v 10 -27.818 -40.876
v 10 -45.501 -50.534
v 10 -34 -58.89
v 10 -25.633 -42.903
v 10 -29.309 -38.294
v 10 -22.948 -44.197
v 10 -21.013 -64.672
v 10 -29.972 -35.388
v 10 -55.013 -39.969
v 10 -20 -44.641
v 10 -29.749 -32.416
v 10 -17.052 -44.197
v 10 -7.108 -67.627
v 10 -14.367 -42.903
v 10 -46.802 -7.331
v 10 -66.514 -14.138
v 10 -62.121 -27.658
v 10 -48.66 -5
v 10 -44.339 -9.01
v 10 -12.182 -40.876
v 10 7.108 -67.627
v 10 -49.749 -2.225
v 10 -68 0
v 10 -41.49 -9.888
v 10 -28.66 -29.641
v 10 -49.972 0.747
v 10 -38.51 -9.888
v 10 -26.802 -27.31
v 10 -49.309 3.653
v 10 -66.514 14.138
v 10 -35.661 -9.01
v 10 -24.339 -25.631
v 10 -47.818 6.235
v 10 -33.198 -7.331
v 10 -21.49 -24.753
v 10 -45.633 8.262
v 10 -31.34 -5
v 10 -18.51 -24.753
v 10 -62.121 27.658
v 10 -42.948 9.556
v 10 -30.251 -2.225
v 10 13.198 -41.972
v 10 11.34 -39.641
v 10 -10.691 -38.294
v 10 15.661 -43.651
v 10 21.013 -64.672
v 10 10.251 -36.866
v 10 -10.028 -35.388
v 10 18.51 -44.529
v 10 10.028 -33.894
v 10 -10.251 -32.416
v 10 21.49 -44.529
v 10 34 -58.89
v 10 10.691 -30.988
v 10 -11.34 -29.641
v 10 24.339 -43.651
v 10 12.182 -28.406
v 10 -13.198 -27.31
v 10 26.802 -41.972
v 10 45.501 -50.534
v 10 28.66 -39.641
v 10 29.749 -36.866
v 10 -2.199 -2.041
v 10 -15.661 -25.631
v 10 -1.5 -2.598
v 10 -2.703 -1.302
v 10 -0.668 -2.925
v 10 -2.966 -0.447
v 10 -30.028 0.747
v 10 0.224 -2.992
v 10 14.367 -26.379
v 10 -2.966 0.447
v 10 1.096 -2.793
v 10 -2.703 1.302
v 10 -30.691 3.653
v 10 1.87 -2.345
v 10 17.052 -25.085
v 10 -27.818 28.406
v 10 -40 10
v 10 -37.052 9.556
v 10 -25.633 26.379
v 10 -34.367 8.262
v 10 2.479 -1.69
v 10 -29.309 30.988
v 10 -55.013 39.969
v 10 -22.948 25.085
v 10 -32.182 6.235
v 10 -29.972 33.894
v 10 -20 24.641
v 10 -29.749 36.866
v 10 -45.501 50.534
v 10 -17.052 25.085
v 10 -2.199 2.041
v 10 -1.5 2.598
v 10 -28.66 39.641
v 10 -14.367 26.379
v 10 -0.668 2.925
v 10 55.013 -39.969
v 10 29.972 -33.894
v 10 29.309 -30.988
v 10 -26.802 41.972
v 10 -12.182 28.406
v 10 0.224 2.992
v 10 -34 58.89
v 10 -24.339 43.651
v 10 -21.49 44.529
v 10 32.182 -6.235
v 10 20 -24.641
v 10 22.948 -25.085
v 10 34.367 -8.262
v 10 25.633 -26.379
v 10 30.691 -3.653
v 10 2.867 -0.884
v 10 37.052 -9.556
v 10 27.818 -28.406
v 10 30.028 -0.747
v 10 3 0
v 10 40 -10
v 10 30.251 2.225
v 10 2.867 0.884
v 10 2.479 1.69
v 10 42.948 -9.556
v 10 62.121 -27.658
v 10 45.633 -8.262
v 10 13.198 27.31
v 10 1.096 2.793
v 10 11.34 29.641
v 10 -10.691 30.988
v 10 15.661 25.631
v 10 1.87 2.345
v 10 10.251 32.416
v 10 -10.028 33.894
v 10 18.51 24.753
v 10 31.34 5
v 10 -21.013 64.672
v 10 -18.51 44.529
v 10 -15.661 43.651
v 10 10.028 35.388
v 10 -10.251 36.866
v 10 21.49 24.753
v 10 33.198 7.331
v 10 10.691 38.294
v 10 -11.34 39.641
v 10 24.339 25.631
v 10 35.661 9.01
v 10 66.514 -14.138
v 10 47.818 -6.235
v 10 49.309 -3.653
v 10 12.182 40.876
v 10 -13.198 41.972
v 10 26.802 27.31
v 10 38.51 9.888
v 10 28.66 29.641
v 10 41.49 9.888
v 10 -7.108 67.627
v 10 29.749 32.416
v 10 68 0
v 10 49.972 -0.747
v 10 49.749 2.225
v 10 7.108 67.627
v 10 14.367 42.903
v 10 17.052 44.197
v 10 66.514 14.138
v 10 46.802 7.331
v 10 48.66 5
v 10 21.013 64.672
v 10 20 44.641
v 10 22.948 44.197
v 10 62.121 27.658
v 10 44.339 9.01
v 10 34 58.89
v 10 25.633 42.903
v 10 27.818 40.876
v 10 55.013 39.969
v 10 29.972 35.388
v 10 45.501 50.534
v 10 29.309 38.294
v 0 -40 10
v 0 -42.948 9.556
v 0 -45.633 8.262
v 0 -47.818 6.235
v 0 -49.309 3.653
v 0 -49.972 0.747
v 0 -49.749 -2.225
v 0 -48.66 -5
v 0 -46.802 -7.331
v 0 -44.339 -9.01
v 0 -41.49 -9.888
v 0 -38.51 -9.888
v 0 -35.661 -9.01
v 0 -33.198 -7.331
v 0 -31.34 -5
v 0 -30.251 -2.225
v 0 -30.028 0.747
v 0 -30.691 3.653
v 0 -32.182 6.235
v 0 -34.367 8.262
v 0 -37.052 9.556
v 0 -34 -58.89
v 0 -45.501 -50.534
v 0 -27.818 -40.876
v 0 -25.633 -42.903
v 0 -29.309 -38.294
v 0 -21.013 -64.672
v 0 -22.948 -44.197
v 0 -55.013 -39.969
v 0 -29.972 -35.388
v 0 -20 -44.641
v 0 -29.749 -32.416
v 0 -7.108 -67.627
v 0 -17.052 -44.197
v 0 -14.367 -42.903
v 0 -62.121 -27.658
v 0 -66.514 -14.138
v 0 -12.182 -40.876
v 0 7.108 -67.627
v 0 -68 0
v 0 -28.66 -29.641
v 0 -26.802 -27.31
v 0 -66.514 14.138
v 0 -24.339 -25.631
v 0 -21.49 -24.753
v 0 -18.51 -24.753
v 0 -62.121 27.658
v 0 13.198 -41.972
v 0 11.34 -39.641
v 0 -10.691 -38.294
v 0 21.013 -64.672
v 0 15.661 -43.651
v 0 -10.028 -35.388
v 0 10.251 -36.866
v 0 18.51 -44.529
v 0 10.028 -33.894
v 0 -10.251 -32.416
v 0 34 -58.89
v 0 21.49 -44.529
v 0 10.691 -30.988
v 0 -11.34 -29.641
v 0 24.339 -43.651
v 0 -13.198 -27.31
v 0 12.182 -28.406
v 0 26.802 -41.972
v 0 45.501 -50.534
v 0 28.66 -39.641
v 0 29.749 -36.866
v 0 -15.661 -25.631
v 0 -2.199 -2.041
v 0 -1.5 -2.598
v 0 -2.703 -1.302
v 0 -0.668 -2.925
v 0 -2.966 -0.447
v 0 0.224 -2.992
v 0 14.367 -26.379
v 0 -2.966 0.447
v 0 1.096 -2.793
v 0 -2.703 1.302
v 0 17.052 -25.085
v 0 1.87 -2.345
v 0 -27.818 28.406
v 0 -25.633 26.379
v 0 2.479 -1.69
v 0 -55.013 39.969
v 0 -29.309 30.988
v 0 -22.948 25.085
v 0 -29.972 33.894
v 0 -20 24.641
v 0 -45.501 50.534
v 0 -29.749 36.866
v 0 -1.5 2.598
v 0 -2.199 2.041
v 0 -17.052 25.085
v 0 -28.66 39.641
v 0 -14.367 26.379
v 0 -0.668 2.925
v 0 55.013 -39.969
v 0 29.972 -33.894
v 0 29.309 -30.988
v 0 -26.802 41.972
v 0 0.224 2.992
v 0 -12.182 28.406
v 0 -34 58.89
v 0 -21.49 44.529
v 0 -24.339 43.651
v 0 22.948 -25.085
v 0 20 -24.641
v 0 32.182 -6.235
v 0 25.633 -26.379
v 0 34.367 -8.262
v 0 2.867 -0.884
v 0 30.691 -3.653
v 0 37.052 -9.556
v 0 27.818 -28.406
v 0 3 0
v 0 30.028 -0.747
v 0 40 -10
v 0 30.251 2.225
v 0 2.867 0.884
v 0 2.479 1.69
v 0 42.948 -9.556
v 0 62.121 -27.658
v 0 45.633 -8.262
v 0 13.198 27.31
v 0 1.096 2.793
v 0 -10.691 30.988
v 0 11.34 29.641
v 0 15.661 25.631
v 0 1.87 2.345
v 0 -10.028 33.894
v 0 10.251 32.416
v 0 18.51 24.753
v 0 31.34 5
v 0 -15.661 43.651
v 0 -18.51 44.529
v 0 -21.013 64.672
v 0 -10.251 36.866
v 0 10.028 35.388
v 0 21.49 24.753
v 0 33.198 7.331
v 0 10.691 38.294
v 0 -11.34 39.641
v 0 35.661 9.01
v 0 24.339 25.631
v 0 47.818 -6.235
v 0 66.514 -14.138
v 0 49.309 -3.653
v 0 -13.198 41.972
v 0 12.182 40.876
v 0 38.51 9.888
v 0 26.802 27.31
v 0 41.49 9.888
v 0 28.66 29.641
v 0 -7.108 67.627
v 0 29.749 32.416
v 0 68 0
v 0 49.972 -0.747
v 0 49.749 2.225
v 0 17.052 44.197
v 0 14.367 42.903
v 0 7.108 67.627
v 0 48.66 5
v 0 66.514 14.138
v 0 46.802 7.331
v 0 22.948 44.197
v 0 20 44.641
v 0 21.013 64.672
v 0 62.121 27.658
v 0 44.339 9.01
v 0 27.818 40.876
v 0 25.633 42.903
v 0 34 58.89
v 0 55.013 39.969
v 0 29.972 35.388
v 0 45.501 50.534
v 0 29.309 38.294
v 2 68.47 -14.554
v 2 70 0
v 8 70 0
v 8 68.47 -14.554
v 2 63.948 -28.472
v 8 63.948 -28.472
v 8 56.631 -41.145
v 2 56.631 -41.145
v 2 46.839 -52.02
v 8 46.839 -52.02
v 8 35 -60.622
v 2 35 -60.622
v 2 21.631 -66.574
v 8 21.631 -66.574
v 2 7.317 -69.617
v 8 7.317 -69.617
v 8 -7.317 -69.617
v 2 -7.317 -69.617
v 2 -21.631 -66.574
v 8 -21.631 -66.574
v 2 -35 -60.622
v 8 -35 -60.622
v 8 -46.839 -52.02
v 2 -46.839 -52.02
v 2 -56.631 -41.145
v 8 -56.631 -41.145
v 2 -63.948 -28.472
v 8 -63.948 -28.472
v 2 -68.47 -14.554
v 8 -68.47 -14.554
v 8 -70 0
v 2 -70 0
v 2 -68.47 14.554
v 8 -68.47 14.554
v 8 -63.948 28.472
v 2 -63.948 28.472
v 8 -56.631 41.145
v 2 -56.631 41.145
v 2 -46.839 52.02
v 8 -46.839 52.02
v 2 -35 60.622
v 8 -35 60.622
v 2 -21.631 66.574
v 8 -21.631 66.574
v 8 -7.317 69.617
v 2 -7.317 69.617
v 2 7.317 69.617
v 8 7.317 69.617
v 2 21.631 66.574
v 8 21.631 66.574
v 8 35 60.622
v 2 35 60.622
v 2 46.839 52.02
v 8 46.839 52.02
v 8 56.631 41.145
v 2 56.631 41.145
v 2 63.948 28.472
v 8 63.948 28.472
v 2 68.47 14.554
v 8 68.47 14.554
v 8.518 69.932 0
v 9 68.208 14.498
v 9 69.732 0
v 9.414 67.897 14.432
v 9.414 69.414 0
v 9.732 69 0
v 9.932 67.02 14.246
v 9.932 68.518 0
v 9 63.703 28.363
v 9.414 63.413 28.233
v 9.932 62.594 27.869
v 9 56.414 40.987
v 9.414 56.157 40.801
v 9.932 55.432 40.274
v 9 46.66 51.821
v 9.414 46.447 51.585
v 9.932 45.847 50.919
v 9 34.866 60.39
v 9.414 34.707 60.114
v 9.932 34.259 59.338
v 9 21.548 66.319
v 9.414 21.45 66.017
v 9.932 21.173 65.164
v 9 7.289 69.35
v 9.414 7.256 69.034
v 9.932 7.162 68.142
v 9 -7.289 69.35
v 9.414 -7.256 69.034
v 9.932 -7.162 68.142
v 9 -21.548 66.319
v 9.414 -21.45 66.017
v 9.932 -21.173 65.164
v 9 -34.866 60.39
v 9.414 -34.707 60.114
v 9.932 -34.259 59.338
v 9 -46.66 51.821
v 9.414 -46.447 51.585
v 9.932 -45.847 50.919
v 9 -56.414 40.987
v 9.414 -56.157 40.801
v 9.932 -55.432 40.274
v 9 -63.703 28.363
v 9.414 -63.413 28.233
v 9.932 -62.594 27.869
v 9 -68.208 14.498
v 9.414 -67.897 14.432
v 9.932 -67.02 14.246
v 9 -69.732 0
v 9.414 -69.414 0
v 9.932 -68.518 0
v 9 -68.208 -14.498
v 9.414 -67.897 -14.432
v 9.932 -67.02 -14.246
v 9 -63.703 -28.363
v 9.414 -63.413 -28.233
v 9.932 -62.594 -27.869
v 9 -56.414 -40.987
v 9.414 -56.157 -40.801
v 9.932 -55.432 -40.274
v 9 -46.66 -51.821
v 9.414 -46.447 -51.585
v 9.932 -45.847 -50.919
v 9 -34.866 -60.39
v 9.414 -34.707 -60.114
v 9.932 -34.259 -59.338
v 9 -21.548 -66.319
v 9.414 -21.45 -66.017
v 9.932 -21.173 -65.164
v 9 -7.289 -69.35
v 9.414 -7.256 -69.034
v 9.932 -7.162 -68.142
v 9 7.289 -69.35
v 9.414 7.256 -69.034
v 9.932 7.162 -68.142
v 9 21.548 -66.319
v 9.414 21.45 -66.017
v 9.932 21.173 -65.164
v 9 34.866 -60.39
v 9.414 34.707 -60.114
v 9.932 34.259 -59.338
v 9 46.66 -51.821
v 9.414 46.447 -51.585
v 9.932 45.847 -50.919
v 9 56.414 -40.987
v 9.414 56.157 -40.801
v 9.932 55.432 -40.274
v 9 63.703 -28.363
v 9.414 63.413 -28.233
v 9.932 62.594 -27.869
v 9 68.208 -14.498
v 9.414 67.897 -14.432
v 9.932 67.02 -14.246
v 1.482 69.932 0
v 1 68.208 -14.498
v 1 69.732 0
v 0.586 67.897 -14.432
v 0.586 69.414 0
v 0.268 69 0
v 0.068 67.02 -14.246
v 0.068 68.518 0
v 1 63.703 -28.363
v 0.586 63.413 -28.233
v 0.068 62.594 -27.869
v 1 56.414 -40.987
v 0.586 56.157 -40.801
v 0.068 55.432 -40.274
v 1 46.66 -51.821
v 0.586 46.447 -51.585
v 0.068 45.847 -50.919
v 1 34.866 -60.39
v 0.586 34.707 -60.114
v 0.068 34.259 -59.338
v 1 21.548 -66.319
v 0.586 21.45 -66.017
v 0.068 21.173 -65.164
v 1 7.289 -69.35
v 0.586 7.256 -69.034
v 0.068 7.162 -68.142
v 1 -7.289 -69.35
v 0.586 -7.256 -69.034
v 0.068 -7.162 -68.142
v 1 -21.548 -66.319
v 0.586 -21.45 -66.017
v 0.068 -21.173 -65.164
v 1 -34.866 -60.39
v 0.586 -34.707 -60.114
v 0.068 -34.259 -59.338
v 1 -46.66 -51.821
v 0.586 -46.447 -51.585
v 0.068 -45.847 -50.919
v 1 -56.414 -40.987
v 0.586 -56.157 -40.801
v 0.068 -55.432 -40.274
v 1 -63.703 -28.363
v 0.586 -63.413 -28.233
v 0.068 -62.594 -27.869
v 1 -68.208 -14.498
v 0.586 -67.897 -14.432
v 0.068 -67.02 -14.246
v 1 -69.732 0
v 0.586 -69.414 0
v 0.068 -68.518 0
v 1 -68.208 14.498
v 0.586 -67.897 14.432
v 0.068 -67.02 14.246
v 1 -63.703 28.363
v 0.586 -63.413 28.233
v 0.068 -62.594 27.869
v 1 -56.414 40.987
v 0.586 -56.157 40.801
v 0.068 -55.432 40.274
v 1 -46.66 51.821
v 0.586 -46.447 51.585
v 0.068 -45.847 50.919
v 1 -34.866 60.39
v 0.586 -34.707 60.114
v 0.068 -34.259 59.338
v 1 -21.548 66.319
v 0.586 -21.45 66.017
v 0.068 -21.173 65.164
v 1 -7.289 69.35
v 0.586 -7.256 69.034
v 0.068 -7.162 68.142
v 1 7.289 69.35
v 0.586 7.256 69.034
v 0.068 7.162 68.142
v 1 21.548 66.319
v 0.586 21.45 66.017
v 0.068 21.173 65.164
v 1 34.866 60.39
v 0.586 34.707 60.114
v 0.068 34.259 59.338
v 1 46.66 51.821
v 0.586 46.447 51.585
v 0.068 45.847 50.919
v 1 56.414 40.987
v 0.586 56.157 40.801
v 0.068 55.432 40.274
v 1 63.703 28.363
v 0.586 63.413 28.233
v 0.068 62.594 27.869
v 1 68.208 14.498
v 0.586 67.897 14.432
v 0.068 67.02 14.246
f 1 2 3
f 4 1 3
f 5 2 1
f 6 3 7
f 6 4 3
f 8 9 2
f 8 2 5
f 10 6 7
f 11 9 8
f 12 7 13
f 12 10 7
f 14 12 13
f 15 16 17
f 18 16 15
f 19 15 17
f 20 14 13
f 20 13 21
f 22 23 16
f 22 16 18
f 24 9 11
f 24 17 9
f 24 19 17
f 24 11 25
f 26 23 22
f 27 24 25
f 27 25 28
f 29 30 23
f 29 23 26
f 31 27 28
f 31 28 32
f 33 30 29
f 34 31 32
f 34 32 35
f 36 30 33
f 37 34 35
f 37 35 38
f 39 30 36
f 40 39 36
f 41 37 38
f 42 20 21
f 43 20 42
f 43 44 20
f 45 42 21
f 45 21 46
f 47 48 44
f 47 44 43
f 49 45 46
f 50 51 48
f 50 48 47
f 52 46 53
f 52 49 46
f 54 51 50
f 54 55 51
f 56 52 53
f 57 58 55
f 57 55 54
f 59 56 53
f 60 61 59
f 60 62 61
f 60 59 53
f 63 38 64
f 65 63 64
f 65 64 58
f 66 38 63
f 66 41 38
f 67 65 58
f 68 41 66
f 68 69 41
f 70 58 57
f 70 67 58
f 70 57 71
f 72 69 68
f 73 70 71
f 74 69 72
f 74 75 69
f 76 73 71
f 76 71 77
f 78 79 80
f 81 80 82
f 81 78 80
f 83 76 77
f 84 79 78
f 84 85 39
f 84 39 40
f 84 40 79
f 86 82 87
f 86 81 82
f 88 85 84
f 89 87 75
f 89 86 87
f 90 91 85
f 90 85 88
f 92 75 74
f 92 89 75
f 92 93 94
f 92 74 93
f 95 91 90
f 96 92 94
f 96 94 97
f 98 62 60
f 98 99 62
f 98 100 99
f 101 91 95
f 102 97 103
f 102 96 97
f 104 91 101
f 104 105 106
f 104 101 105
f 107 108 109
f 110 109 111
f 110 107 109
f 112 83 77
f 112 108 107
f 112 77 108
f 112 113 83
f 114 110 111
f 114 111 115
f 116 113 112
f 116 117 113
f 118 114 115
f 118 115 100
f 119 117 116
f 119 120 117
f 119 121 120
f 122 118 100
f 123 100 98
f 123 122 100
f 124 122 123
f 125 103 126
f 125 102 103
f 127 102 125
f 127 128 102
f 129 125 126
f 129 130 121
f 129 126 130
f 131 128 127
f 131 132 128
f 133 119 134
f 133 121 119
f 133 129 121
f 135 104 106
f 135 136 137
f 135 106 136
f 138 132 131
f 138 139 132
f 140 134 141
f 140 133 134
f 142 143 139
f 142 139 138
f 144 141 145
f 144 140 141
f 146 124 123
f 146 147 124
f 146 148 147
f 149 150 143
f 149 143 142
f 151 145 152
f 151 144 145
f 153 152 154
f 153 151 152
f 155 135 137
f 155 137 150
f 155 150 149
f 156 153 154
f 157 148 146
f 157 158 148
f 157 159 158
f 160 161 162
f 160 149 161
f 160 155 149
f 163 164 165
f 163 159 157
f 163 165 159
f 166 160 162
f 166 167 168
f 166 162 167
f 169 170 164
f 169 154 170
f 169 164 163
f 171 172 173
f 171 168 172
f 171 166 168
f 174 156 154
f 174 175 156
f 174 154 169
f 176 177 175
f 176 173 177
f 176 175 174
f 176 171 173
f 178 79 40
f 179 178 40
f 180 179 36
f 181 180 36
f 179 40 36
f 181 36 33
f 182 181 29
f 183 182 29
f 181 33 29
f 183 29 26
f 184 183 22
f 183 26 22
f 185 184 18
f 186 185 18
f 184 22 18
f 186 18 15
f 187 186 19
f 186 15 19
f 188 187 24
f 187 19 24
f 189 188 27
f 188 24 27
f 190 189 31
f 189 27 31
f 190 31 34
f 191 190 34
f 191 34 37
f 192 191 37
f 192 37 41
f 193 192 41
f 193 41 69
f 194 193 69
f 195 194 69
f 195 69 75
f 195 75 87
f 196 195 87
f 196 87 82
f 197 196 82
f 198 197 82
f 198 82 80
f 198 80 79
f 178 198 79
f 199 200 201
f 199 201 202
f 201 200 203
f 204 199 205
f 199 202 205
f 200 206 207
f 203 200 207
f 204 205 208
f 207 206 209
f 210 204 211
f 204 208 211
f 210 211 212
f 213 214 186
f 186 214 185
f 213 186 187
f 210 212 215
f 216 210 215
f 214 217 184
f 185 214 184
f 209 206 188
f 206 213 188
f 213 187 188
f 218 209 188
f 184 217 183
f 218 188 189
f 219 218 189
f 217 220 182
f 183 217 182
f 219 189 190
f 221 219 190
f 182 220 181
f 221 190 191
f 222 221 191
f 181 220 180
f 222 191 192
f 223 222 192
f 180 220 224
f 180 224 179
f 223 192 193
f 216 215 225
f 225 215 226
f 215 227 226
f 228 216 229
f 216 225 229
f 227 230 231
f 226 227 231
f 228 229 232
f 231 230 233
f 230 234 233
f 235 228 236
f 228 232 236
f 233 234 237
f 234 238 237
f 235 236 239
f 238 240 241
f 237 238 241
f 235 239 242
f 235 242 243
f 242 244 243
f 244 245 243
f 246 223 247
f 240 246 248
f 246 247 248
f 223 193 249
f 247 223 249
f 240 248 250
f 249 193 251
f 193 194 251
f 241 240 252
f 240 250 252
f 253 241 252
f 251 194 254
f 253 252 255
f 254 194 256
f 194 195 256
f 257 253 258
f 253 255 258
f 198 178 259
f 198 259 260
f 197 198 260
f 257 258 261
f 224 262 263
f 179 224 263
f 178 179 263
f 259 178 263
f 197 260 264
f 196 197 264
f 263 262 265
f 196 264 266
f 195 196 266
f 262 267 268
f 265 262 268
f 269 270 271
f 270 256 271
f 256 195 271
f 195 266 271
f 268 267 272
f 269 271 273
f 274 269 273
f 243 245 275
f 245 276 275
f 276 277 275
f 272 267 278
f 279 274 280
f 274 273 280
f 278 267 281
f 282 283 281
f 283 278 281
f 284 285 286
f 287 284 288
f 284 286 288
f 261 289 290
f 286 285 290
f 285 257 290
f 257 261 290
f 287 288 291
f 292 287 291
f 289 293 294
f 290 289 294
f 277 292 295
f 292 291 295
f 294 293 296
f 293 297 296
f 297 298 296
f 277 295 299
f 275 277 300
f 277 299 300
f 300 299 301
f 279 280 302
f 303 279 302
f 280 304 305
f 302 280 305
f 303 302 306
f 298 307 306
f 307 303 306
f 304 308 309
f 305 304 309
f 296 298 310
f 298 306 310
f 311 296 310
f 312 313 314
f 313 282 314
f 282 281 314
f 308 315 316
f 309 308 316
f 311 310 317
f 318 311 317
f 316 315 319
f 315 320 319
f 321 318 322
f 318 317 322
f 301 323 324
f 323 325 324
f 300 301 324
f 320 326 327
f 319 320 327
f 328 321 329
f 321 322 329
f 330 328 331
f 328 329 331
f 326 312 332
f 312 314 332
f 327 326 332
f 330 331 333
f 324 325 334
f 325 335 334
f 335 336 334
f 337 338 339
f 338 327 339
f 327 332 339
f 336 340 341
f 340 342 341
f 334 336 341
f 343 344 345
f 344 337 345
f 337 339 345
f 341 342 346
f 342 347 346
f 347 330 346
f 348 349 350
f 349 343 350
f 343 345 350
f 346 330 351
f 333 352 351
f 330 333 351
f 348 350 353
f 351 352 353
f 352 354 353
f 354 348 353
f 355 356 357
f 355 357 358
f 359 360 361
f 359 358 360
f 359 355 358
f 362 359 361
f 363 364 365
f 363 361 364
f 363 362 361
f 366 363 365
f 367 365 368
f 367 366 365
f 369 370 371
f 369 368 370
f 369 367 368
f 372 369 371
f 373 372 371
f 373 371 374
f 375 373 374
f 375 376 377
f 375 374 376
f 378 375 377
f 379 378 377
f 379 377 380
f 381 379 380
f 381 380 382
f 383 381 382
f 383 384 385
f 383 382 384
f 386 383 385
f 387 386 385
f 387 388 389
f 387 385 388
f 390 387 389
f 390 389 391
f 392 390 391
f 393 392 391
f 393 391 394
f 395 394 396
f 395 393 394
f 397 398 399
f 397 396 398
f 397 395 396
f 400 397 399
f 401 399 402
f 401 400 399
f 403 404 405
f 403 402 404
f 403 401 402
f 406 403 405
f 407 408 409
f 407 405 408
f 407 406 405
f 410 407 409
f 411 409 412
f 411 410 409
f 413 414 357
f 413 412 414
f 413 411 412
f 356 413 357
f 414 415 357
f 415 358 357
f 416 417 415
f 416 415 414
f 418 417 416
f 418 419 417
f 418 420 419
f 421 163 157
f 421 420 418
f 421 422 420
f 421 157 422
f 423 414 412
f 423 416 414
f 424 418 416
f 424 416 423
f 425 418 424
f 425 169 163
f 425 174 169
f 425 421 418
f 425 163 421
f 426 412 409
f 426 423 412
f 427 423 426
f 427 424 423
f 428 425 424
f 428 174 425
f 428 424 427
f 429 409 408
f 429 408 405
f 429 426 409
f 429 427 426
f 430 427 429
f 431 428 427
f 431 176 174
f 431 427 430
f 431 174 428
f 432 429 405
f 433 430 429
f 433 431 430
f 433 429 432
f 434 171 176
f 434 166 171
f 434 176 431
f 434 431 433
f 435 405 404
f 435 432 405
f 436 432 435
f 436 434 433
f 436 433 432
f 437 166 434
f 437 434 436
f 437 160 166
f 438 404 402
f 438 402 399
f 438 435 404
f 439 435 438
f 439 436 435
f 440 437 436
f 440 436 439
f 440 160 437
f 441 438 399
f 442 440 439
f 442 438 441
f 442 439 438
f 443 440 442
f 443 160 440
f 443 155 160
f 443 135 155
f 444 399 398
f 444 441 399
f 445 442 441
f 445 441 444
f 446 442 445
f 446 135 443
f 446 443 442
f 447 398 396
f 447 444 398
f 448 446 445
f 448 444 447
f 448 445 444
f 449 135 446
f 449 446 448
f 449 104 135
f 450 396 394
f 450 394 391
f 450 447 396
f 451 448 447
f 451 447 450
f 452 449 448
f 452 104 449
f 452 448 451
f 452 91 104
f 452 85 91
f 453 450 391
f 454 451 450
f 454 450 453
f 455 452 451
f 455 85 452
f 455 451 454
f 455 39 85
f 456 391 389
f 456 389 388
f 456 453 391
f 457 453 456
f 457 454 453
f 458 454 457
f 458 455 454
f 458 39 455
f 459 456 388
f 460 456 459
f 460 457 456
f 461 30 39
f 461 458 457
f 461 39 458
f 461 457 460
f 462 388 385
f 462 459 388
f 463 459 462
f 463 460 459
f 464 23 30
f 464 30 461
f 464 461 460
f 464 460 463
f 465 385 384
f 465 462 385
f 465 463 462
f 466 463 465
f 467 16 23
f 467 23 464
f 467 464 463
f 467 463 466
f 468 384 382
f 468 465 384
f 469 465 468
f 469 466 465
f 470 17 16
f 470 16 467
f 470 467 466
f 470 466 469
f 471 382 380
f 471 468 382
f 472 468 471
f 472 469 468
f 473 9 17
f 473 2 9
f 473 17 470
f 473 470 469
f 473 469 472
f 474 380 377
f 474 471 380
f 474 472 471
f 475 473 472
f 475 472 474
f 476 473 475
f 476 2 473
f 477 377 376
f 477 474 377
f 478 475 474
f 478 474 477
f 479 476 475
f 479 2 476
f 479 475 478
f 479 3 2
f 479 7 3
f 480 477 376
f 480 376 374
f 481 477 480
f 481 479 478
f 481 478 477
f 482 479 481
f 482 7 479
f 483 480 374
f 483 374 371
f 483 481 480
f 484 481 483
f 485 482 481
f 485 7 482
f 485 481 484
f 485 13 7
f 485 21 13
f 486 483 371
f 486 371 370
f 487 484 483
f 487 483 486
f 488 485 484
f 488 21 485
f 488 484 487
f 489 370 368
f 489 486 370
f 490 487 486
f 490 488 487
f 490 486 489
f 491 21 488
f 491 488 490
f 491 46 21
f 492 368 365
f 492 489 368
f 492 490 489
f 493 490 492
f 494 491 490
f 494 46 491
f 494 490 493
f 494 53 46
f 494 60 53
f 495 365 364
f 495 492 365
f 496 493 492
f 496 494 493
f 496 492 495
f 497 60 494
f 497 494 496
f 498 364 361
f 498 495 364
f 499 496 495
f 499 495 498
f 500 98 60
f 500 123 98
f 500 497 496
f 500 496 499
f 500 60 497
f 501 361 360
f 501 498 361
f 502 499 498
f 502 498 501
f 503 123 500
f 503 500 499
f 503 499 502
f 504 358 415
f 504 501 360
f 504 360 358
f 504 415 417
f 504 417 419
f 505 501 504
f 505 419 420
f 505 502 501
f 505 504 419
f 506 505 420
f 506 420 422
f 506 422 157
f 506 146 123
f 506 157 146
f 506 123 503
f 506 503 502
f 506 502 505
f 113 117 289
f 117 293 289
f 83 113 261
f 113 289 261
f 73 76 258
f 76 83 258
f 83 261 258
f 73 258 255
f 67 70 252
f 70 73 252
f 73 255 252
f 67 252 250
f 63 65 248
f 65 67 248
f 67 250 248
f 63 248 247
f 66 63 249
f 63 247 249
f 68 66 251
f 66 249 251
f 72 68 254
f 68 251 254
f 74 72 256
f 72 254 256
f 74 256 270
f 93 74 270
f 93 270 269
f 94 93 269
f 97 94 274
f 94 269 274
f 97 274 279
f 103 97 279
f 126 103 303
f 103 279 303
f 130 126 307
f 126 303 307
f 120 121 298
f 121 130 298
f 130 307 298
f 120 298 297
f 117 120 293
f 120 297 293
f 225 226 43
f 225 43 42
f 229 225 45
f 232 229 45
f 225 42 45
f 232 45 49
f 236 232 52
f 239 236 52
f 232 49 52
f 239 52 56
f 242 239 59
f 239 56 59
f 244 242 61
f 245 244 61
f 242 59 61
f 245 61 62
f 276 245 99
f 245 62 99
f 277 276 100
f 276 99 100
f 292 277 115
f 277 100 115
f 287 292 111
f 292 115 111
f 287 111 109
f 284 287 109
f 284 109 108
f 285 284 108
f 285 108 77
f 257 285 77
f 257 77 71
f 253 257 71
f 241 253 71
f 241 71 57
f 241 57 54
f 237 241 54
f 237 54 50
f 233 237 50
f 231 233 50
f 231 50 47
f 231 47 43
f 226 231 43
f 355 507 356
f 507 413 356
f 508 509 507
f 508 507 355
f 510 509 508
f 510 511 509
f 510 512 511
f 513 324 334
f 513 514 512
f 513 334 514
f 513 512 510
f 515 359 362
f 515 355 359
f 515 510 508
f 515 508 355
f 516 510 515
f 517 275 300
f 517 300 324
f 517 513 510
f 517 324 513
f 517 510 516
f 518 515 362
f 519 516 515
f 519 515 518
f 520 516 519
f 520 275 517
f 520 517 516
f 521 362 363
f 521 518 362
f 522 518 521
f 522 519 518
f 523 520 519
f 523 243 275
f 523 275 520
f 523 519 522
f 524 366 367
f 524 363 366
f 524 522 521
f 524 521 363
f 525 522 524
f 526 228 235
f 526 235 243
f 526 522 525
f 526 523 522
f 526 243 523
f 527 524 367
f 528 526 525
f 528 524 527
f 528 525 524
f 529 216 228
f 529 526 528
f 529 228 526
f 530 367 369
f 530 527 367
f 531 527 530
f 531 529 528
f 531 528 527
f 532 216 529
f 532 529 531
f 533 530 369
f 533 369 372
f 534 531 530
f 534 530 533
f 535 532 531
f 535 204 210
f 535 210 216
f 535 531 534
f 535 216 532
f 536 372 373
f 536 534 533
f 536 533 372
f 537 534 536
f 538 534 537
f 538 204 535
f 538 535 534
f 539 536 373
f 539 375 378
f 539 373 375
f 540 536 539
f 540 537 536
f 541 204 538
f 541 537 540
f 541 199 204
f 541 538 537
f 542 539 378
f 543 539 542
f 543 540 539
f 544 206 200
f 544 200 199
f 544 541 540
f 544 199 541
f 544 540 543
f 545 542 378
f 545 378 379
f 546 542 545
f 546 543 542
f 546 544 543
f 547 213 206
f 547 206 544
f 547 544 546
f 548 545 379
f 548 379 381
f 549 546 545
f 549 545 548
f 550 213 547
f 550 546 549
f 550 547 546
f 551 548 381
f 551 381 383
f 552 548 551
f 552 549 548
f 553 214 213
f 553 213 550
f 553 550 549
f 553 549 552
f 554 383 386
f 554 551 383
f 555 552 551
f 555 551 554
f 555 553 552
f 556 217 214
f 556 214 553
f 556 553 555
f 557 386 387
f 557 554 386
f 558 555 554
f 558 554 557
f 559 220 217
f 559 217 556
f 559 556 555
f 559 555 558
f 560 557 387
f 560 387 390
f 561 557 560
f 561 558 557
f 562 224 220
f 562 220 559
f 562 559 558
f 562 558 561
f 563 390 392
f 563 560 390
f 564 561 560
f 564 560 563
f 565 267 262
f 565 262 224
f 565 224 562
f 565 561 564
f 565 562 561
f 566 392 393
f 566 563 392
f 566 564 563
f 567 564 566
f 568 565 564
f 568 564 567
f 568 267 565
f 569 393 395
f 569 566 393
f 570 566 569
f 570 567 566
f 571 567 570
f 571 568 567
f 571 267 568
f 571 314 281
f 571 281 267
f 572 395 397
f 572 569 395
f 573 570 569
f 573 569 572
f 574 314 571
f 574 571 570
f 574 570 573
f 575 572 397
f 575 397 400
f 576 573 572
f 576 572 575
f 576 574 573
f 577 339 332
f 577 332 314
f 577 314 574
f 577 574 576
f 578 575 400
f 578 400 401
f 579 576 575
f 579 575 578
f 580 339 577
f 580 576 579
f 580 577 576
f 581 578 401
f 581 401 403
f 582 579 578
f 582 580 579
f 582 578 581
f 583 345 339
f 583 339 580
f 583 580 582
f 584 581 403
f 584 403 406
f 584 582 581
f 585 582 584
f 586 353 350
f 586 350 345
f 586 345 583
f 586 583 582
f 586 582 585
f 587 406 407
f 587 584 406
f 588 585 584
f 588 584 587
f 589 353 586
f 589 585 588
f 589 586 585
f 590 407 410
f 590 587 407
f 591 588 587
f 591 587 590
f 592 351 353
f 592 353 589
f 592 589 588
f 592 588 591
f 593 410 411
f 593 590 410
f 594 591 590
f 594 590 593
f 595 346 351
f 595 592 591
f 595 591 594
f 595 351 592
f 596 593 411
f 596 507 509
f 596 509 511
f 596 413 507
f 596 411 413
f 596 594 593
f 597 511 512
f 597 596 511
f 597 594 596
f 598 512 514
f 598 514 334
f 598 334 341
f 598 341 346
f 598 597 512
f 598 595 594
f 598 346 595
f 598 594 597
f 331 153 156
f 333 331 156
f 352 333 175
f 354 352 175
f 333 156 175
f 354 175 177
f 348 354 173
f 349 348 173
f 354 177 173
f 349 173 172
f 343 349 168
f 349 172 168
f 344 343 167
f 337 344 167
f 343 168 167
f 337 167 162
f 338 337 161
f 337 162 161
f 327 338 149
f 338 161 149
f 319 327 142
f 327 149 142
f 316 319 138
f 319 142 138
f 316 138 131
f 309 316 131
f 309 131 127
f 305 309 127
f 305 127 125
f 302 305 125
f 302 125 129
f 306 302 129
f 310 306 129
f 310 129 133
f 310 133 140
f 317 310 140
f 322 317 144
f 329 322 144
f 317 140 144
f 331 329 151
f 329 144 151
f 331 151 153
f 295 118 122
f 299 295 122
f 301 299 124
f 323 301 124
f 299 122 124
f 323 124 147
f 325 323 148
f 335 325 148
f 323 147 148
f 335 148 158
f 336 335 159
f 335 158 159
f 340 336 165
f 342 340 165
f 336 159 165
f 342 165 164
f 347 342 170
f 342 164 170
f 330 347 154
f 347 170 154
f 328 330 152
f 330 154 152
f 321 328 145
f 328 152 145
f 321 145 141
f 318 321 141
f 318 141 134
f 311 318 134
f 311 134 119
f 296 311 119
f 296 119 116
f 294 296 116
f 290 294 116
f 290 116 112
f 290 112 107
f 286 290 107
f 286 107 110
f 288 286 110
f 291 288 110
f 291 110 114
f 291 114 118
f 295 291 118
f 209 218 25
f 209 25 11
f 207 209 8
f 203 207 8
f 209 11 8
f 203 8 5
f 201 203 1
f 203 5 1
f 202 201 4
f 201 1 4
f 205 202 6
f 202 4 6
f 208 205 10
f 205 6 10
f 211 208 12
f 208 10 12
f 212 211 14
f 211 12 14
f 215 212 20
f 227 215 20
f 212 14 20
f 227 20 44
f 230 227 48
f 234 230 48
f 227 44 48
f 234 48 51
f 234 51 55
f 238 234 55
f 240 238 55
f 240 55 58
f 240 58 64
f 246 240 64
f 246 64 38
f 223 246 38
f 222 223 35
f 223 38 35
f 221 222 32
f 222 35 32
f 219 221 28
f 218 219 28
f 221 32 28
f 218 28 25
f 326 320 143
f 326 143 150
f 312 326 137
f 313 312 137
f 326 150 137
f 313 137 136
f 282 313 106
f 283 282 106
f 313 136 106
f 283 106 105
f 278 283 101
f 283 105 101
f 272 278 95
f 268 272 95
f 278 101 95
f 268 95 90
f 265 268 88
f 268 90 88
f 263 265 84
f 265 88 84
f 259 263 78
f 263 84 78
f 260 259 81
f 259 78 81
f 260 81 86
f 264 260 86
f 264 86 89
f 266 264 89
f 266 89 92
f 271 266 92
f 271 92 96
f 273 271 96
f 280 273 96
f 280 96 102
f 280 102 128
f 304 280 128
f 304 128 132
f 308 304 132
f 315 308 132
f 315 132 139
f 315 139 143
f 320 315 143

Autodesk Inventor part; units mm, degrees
ref_plane "YZ Plane" through (0, 0, 0) normal (1, 0, 0) x (0, 1, 0)
ref_plane "XY Plane" through (0, 0, 0) normal (0, 0, 1) x (1, 0, 0)
sketch "Sketch1" plane through (0, 0, 0) normal (1, 0, 0) x (0, 1, 0)
  circle A0 centre (0, 0) radius 3
  circle A1 centre (0, 0) radius 70
  dimension "d0" = 140
  dimension "d1" = 6
extrude "Extrusion1" add sketch "Sketch1" along normal blind 10
fillet "Fillet1" radius 2 2 edges at (10, -70, 0) (0, -70, 0)
sketch "Sketch2" plane through (10, 0, 0) normal (1, 0, 0) x (0, 0, -1)
  circle A0 centre (0, 40) radius 10
  circle A1 centre (0, 0) radius 3 projected
  dimension "d5" = 20
  dimension "d6" = 40
extrude "Extrusion2" cut sketch "Sketch2" against normal blind 10 contours A0
pattern_circular "Circular Pattern1" count 6 over 360 about axis through (0, 0, 0) along (1, 0, 0) of "Extrusion2"
ref_plane "Work Plane1" through (0, -70, 0) normal (0, 1, 0) x (-1, 0, 0)
properties part number "05_Banh_xe" material "Acetal Resin, Black"
